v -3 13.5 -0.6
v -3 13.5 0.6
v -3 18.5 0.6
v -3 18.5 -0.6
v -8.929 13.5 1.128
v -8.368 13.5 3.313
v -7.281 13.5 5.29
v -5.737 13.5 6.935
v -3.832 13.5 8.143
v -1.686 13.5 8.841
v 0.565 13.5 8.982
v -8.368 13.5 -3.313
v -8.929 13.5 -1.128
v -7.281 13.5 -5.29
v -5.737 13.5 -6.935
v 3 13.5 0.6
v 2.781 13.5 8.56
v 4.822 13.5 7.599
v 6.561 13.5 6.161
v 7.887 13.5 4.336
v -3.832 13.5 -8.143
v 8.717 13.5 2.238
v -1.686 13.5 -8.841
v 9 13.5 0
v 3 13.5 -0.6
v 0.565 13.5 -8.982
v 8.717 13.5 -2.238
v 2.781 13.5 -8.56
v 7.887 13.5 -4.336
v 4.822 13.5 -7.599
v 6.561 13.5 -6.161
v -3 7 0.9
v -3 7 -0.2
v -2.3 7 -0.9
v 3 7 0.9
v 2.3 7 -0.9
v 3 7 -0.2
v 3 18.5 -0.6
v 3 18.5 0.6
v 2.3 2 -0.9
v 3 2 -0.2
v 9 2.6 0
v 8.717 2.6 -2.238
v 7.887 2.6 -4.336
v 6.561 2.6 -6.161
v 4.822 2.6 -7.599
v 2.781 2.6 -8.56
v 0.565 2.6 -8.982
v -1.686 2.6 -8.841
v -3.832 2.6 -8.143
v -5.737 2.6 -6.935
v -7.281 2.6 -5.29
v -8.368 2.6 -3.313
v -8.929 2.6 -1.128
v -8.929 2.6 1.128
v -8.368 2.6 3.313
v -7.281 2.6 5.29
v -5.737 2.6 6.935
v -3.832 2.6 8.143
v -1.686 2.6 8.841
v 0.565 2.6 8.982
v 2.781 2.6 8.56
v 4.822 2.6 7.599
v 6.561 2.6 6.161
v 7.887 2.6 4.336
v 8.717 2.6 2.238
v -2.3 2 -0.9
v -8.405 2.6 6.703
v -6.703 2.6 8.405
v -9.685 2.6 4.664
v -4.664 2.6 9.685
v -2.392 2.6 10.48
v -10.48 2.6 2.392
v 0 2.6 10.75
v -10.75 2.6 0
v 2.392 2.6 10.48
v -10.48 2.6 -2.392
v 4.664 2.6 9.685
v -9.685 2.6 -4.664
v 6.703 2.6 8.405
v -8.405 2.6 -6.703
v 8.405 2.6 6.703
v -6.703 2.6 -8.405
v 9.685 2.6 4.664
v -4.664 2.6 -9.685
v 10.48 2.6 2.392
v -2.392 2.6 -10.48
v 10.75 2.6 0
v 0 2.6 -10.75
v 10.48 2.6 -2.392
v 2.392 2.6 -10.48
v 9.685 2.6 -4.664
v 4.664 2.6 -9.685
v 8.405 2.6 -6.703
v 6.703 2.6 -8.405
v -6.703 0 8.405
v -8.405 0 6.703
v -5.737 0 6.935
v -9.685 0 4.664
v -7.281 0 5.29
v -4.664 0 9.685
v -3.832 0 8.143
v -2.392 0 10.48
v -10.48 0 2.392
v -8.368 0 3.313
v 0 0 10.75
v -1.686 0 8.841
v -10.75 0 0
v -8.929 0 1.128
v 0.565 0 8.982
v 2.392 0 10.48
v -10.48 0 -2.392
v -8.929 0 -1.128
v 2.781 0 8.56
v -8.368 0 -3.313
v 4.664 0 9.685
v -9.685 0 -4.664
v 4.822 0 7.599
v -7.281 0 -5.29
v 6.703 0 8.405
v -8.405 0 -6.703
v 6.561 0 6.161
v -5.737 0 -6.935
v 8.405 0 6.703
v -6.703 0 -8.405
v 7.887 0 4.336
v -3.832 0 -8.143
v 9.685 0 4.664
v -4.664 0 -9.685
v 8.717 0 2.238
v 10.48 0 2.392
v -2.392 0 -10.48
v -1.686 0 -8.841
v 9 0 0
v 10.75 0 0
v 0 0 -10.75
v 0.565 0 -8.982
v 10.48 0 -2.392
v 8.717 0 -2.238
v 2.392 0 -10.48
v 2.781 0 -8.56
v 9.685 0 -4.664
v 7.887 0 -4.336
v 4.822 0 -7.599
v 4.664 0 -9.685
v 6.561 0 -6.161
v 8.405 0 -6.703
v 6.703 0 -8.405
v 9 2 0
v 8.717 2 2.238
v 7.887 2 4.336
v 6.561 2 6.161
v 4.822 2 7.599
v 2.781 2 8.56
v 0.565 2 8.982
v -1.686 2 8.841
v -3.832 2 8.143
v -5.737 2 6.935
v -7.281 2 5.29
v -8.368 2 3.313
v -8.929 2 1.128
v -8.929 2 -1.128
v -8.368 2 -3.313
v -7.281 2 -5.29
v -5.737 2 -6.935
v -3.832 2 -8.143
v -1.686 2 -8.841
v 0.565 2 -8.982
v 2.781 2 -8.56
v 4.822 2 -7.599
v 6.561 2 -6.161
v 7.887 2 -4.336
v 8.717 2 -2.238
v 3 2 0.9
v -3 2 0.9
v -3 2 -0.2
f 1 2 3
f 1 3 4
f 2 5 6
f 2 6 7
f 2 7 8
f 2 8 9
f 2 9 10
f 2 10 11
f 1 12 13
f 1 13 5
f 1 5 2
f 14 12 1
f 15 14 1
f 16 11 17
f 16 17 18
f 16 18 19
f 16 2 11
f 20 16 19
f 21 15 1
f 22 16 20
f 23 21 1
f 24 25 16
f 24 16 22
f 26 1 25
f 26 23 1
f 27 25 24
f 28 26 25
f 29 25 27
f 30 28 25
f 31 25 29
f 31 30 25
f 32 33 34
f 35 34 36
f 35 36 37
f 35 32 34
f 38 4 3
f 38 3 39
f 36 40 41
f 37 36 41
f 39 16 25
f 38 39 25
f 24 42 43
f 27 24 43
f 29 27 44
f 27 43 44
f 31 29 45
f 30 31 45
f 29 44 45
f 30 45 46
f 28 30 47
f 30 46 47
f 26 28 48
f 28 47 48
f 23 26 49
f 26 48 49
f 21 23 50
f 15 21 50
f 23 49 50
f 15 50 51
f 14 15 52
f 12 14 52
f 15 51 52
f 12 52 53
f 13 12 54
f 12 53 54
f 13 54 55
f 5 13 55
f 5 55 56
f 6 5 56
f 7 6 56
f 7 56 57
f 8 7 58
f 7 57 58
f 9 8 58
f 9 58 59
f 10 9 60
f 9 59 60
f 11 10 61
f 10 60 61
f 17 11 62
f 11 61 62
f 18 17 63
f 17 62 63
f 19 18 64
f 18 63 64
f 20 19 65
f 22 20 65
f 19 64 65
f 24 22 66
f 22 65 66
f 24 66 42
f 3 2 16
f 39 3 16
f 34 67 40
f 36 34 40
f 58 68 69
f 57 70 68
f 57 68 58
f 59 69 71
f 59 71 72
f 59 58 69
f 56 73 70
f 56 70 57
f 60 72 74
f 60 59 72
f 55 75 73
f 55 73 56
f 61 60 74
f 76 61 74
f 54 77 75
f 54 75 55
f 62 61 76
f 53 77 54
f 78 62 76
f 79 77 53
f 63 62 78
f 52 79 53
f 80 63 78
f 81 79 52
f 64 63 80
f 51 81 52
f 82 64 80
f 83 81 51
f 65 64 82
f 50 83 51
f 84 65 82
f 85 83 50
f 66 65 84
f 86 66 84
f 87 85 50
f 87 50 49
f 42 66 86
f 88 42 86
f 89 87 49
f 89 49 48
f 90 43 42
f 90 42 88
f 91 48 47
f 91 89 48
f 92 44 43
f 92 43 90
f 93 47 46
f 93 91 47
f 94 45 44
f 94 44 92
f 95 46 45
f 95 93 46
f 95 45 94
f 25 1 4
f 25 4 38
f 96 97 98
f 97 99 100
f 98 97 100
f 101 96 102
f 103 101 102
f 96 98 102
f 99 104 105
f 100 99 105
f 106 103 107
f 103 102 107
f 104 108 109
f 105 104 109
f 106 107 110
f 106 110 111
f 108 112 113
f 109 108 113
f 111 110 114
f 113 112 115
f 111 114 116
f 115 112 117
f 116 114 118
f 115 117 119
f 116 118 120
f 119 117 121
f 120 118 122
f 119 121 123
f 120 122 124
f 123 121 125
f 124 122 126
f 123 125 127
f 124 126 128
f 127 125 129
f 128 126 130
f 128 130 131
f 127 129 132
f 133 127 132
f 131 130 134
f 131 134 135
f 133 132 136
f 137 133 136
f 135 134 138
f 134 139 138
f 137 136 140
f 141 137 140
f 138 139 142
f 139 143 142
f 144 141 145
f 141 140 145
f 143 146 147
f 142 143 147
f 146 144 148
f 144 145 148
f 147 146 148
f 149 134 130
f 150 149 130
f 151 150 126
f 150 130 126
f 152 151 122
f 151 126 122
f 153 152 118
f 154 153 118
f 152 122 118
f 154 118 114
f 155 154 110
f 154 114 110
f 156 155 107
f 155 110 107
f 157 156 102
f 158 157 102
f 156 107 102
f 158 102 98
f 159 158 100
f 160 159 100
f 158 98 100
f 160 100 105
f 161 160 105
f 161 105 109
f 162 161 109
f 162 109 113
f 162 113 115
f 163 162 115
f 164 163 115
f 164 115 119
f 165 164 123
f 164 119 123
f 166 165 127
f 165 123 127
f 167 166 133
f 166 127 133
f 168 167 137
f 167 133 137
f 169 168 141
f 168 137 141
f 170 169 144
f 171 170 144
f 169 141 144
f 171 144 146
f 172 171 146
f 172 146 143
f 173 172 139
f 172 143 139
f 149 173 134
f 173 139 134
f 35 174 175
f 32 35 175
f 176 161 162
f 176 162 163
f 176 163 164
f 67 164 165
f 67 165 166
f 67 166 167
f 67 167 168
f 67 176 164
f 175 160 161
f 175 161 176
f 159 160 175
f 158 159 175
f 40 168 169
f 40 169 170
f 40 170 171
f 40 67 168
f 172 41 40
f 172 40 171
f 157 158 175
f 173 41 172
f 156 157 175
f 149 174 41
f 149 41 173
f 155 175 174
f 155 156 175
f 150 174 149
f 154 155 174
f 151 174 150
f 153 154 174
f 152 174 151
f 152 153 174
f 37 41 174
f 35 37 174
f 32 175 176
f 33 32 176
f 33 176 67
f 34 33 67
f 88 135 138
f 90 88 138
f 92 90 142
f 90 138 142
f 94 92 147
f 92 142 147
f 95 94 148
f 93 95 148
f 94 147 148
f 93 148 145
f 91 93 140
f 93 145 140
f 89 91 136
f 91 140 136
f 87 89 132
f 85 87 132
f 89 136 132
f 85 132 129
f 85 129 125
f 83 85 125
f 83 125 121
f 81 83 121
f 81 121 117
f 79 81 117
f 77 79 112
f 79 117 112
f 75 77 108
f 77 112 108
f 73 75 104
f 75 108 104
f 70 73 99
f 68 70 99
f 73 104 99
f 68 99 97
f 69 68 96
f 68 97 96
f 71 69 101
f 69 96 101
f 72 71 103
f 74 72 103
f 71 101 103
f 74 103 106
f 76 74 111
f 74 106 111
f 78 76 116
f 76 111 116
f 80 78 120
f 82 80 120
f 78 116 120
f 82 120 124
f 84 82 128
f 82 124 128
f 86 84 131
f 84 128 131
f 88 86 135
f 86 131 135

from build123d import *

# Parameters (mm, degrees)
SKETCH1_R           = 10.75
BOSS_EXTRUDE1_DEPTH = 2.6
SKETCH2_R           = 9
BOSS_EXTRUDE2_DEPTH = 10.9
SKETCH3_W           = 6
SKETCH3_H           = 1.2
BOSS_EXTRUDE3_DEPTH = 5
SKETCH4_R           = 9
CUT_EXTRUDE2_DEPTH  = 2
CUT_EXTRUDE3_DEPTH  = 5


with BuildPart() as part:
    # Sketch1 → Boss-Extrude1 (new body)
    with BuildSketch(Plane(origin=(0, 0, 0), x_dir=(1, 0, 0), z_dir=(0, 1, 0))):
        Circle(SKETCH1_R)
    extrude(amount=BOSS_EXTRUDE1_DEPTH)

    # Sketch2 → Boss-Extrude2 (add)
    with BuildSketch(Plane(origin=(0, 2.6, 0), x_dir=(1, 0, 0), z_dir=(0, 1, 0))):
        Circle(SKETCH2_R)
    extrude(amount=BOSS_EXTRUDE2_DEPTH)

    # Sketch3 → Boss-Extrude3 (add)
    with BuildSketch(Plane(origin=(0, 13.5, 0), x_dir=(1, 0, 0), z_dir=(0, 1, 0))):
        Rectangle(SKETCH3_W, SKETCH3_H)
    extrude(amount=BOSS_EXTRUDE3_DEPTH)

    # Sketch4 → Cut-Extrude2 (cut)
    with BuildSketch(Plane.XZ):
        Circle(SKETCH4_R)
    extrude(amount=-CUT_EXTRUDE2_DEPTH, mode=Mode.SUBTRACT)

    # Sketch5 → Cut-Extrude3 (cut)
    with BuildSketch(Plane.XZ.offset(-2)):
        Polygon((-3, 0.9), (-3, -0.2), (-2.3, -0.9), (2.3, -0.9), (3, -0.2), (3, 0.9), align=None)
    extrude(amount=-CUT_EXTRUDE3_DEPTH, mode=Mode.SUBTRACT)


solid = part.part
